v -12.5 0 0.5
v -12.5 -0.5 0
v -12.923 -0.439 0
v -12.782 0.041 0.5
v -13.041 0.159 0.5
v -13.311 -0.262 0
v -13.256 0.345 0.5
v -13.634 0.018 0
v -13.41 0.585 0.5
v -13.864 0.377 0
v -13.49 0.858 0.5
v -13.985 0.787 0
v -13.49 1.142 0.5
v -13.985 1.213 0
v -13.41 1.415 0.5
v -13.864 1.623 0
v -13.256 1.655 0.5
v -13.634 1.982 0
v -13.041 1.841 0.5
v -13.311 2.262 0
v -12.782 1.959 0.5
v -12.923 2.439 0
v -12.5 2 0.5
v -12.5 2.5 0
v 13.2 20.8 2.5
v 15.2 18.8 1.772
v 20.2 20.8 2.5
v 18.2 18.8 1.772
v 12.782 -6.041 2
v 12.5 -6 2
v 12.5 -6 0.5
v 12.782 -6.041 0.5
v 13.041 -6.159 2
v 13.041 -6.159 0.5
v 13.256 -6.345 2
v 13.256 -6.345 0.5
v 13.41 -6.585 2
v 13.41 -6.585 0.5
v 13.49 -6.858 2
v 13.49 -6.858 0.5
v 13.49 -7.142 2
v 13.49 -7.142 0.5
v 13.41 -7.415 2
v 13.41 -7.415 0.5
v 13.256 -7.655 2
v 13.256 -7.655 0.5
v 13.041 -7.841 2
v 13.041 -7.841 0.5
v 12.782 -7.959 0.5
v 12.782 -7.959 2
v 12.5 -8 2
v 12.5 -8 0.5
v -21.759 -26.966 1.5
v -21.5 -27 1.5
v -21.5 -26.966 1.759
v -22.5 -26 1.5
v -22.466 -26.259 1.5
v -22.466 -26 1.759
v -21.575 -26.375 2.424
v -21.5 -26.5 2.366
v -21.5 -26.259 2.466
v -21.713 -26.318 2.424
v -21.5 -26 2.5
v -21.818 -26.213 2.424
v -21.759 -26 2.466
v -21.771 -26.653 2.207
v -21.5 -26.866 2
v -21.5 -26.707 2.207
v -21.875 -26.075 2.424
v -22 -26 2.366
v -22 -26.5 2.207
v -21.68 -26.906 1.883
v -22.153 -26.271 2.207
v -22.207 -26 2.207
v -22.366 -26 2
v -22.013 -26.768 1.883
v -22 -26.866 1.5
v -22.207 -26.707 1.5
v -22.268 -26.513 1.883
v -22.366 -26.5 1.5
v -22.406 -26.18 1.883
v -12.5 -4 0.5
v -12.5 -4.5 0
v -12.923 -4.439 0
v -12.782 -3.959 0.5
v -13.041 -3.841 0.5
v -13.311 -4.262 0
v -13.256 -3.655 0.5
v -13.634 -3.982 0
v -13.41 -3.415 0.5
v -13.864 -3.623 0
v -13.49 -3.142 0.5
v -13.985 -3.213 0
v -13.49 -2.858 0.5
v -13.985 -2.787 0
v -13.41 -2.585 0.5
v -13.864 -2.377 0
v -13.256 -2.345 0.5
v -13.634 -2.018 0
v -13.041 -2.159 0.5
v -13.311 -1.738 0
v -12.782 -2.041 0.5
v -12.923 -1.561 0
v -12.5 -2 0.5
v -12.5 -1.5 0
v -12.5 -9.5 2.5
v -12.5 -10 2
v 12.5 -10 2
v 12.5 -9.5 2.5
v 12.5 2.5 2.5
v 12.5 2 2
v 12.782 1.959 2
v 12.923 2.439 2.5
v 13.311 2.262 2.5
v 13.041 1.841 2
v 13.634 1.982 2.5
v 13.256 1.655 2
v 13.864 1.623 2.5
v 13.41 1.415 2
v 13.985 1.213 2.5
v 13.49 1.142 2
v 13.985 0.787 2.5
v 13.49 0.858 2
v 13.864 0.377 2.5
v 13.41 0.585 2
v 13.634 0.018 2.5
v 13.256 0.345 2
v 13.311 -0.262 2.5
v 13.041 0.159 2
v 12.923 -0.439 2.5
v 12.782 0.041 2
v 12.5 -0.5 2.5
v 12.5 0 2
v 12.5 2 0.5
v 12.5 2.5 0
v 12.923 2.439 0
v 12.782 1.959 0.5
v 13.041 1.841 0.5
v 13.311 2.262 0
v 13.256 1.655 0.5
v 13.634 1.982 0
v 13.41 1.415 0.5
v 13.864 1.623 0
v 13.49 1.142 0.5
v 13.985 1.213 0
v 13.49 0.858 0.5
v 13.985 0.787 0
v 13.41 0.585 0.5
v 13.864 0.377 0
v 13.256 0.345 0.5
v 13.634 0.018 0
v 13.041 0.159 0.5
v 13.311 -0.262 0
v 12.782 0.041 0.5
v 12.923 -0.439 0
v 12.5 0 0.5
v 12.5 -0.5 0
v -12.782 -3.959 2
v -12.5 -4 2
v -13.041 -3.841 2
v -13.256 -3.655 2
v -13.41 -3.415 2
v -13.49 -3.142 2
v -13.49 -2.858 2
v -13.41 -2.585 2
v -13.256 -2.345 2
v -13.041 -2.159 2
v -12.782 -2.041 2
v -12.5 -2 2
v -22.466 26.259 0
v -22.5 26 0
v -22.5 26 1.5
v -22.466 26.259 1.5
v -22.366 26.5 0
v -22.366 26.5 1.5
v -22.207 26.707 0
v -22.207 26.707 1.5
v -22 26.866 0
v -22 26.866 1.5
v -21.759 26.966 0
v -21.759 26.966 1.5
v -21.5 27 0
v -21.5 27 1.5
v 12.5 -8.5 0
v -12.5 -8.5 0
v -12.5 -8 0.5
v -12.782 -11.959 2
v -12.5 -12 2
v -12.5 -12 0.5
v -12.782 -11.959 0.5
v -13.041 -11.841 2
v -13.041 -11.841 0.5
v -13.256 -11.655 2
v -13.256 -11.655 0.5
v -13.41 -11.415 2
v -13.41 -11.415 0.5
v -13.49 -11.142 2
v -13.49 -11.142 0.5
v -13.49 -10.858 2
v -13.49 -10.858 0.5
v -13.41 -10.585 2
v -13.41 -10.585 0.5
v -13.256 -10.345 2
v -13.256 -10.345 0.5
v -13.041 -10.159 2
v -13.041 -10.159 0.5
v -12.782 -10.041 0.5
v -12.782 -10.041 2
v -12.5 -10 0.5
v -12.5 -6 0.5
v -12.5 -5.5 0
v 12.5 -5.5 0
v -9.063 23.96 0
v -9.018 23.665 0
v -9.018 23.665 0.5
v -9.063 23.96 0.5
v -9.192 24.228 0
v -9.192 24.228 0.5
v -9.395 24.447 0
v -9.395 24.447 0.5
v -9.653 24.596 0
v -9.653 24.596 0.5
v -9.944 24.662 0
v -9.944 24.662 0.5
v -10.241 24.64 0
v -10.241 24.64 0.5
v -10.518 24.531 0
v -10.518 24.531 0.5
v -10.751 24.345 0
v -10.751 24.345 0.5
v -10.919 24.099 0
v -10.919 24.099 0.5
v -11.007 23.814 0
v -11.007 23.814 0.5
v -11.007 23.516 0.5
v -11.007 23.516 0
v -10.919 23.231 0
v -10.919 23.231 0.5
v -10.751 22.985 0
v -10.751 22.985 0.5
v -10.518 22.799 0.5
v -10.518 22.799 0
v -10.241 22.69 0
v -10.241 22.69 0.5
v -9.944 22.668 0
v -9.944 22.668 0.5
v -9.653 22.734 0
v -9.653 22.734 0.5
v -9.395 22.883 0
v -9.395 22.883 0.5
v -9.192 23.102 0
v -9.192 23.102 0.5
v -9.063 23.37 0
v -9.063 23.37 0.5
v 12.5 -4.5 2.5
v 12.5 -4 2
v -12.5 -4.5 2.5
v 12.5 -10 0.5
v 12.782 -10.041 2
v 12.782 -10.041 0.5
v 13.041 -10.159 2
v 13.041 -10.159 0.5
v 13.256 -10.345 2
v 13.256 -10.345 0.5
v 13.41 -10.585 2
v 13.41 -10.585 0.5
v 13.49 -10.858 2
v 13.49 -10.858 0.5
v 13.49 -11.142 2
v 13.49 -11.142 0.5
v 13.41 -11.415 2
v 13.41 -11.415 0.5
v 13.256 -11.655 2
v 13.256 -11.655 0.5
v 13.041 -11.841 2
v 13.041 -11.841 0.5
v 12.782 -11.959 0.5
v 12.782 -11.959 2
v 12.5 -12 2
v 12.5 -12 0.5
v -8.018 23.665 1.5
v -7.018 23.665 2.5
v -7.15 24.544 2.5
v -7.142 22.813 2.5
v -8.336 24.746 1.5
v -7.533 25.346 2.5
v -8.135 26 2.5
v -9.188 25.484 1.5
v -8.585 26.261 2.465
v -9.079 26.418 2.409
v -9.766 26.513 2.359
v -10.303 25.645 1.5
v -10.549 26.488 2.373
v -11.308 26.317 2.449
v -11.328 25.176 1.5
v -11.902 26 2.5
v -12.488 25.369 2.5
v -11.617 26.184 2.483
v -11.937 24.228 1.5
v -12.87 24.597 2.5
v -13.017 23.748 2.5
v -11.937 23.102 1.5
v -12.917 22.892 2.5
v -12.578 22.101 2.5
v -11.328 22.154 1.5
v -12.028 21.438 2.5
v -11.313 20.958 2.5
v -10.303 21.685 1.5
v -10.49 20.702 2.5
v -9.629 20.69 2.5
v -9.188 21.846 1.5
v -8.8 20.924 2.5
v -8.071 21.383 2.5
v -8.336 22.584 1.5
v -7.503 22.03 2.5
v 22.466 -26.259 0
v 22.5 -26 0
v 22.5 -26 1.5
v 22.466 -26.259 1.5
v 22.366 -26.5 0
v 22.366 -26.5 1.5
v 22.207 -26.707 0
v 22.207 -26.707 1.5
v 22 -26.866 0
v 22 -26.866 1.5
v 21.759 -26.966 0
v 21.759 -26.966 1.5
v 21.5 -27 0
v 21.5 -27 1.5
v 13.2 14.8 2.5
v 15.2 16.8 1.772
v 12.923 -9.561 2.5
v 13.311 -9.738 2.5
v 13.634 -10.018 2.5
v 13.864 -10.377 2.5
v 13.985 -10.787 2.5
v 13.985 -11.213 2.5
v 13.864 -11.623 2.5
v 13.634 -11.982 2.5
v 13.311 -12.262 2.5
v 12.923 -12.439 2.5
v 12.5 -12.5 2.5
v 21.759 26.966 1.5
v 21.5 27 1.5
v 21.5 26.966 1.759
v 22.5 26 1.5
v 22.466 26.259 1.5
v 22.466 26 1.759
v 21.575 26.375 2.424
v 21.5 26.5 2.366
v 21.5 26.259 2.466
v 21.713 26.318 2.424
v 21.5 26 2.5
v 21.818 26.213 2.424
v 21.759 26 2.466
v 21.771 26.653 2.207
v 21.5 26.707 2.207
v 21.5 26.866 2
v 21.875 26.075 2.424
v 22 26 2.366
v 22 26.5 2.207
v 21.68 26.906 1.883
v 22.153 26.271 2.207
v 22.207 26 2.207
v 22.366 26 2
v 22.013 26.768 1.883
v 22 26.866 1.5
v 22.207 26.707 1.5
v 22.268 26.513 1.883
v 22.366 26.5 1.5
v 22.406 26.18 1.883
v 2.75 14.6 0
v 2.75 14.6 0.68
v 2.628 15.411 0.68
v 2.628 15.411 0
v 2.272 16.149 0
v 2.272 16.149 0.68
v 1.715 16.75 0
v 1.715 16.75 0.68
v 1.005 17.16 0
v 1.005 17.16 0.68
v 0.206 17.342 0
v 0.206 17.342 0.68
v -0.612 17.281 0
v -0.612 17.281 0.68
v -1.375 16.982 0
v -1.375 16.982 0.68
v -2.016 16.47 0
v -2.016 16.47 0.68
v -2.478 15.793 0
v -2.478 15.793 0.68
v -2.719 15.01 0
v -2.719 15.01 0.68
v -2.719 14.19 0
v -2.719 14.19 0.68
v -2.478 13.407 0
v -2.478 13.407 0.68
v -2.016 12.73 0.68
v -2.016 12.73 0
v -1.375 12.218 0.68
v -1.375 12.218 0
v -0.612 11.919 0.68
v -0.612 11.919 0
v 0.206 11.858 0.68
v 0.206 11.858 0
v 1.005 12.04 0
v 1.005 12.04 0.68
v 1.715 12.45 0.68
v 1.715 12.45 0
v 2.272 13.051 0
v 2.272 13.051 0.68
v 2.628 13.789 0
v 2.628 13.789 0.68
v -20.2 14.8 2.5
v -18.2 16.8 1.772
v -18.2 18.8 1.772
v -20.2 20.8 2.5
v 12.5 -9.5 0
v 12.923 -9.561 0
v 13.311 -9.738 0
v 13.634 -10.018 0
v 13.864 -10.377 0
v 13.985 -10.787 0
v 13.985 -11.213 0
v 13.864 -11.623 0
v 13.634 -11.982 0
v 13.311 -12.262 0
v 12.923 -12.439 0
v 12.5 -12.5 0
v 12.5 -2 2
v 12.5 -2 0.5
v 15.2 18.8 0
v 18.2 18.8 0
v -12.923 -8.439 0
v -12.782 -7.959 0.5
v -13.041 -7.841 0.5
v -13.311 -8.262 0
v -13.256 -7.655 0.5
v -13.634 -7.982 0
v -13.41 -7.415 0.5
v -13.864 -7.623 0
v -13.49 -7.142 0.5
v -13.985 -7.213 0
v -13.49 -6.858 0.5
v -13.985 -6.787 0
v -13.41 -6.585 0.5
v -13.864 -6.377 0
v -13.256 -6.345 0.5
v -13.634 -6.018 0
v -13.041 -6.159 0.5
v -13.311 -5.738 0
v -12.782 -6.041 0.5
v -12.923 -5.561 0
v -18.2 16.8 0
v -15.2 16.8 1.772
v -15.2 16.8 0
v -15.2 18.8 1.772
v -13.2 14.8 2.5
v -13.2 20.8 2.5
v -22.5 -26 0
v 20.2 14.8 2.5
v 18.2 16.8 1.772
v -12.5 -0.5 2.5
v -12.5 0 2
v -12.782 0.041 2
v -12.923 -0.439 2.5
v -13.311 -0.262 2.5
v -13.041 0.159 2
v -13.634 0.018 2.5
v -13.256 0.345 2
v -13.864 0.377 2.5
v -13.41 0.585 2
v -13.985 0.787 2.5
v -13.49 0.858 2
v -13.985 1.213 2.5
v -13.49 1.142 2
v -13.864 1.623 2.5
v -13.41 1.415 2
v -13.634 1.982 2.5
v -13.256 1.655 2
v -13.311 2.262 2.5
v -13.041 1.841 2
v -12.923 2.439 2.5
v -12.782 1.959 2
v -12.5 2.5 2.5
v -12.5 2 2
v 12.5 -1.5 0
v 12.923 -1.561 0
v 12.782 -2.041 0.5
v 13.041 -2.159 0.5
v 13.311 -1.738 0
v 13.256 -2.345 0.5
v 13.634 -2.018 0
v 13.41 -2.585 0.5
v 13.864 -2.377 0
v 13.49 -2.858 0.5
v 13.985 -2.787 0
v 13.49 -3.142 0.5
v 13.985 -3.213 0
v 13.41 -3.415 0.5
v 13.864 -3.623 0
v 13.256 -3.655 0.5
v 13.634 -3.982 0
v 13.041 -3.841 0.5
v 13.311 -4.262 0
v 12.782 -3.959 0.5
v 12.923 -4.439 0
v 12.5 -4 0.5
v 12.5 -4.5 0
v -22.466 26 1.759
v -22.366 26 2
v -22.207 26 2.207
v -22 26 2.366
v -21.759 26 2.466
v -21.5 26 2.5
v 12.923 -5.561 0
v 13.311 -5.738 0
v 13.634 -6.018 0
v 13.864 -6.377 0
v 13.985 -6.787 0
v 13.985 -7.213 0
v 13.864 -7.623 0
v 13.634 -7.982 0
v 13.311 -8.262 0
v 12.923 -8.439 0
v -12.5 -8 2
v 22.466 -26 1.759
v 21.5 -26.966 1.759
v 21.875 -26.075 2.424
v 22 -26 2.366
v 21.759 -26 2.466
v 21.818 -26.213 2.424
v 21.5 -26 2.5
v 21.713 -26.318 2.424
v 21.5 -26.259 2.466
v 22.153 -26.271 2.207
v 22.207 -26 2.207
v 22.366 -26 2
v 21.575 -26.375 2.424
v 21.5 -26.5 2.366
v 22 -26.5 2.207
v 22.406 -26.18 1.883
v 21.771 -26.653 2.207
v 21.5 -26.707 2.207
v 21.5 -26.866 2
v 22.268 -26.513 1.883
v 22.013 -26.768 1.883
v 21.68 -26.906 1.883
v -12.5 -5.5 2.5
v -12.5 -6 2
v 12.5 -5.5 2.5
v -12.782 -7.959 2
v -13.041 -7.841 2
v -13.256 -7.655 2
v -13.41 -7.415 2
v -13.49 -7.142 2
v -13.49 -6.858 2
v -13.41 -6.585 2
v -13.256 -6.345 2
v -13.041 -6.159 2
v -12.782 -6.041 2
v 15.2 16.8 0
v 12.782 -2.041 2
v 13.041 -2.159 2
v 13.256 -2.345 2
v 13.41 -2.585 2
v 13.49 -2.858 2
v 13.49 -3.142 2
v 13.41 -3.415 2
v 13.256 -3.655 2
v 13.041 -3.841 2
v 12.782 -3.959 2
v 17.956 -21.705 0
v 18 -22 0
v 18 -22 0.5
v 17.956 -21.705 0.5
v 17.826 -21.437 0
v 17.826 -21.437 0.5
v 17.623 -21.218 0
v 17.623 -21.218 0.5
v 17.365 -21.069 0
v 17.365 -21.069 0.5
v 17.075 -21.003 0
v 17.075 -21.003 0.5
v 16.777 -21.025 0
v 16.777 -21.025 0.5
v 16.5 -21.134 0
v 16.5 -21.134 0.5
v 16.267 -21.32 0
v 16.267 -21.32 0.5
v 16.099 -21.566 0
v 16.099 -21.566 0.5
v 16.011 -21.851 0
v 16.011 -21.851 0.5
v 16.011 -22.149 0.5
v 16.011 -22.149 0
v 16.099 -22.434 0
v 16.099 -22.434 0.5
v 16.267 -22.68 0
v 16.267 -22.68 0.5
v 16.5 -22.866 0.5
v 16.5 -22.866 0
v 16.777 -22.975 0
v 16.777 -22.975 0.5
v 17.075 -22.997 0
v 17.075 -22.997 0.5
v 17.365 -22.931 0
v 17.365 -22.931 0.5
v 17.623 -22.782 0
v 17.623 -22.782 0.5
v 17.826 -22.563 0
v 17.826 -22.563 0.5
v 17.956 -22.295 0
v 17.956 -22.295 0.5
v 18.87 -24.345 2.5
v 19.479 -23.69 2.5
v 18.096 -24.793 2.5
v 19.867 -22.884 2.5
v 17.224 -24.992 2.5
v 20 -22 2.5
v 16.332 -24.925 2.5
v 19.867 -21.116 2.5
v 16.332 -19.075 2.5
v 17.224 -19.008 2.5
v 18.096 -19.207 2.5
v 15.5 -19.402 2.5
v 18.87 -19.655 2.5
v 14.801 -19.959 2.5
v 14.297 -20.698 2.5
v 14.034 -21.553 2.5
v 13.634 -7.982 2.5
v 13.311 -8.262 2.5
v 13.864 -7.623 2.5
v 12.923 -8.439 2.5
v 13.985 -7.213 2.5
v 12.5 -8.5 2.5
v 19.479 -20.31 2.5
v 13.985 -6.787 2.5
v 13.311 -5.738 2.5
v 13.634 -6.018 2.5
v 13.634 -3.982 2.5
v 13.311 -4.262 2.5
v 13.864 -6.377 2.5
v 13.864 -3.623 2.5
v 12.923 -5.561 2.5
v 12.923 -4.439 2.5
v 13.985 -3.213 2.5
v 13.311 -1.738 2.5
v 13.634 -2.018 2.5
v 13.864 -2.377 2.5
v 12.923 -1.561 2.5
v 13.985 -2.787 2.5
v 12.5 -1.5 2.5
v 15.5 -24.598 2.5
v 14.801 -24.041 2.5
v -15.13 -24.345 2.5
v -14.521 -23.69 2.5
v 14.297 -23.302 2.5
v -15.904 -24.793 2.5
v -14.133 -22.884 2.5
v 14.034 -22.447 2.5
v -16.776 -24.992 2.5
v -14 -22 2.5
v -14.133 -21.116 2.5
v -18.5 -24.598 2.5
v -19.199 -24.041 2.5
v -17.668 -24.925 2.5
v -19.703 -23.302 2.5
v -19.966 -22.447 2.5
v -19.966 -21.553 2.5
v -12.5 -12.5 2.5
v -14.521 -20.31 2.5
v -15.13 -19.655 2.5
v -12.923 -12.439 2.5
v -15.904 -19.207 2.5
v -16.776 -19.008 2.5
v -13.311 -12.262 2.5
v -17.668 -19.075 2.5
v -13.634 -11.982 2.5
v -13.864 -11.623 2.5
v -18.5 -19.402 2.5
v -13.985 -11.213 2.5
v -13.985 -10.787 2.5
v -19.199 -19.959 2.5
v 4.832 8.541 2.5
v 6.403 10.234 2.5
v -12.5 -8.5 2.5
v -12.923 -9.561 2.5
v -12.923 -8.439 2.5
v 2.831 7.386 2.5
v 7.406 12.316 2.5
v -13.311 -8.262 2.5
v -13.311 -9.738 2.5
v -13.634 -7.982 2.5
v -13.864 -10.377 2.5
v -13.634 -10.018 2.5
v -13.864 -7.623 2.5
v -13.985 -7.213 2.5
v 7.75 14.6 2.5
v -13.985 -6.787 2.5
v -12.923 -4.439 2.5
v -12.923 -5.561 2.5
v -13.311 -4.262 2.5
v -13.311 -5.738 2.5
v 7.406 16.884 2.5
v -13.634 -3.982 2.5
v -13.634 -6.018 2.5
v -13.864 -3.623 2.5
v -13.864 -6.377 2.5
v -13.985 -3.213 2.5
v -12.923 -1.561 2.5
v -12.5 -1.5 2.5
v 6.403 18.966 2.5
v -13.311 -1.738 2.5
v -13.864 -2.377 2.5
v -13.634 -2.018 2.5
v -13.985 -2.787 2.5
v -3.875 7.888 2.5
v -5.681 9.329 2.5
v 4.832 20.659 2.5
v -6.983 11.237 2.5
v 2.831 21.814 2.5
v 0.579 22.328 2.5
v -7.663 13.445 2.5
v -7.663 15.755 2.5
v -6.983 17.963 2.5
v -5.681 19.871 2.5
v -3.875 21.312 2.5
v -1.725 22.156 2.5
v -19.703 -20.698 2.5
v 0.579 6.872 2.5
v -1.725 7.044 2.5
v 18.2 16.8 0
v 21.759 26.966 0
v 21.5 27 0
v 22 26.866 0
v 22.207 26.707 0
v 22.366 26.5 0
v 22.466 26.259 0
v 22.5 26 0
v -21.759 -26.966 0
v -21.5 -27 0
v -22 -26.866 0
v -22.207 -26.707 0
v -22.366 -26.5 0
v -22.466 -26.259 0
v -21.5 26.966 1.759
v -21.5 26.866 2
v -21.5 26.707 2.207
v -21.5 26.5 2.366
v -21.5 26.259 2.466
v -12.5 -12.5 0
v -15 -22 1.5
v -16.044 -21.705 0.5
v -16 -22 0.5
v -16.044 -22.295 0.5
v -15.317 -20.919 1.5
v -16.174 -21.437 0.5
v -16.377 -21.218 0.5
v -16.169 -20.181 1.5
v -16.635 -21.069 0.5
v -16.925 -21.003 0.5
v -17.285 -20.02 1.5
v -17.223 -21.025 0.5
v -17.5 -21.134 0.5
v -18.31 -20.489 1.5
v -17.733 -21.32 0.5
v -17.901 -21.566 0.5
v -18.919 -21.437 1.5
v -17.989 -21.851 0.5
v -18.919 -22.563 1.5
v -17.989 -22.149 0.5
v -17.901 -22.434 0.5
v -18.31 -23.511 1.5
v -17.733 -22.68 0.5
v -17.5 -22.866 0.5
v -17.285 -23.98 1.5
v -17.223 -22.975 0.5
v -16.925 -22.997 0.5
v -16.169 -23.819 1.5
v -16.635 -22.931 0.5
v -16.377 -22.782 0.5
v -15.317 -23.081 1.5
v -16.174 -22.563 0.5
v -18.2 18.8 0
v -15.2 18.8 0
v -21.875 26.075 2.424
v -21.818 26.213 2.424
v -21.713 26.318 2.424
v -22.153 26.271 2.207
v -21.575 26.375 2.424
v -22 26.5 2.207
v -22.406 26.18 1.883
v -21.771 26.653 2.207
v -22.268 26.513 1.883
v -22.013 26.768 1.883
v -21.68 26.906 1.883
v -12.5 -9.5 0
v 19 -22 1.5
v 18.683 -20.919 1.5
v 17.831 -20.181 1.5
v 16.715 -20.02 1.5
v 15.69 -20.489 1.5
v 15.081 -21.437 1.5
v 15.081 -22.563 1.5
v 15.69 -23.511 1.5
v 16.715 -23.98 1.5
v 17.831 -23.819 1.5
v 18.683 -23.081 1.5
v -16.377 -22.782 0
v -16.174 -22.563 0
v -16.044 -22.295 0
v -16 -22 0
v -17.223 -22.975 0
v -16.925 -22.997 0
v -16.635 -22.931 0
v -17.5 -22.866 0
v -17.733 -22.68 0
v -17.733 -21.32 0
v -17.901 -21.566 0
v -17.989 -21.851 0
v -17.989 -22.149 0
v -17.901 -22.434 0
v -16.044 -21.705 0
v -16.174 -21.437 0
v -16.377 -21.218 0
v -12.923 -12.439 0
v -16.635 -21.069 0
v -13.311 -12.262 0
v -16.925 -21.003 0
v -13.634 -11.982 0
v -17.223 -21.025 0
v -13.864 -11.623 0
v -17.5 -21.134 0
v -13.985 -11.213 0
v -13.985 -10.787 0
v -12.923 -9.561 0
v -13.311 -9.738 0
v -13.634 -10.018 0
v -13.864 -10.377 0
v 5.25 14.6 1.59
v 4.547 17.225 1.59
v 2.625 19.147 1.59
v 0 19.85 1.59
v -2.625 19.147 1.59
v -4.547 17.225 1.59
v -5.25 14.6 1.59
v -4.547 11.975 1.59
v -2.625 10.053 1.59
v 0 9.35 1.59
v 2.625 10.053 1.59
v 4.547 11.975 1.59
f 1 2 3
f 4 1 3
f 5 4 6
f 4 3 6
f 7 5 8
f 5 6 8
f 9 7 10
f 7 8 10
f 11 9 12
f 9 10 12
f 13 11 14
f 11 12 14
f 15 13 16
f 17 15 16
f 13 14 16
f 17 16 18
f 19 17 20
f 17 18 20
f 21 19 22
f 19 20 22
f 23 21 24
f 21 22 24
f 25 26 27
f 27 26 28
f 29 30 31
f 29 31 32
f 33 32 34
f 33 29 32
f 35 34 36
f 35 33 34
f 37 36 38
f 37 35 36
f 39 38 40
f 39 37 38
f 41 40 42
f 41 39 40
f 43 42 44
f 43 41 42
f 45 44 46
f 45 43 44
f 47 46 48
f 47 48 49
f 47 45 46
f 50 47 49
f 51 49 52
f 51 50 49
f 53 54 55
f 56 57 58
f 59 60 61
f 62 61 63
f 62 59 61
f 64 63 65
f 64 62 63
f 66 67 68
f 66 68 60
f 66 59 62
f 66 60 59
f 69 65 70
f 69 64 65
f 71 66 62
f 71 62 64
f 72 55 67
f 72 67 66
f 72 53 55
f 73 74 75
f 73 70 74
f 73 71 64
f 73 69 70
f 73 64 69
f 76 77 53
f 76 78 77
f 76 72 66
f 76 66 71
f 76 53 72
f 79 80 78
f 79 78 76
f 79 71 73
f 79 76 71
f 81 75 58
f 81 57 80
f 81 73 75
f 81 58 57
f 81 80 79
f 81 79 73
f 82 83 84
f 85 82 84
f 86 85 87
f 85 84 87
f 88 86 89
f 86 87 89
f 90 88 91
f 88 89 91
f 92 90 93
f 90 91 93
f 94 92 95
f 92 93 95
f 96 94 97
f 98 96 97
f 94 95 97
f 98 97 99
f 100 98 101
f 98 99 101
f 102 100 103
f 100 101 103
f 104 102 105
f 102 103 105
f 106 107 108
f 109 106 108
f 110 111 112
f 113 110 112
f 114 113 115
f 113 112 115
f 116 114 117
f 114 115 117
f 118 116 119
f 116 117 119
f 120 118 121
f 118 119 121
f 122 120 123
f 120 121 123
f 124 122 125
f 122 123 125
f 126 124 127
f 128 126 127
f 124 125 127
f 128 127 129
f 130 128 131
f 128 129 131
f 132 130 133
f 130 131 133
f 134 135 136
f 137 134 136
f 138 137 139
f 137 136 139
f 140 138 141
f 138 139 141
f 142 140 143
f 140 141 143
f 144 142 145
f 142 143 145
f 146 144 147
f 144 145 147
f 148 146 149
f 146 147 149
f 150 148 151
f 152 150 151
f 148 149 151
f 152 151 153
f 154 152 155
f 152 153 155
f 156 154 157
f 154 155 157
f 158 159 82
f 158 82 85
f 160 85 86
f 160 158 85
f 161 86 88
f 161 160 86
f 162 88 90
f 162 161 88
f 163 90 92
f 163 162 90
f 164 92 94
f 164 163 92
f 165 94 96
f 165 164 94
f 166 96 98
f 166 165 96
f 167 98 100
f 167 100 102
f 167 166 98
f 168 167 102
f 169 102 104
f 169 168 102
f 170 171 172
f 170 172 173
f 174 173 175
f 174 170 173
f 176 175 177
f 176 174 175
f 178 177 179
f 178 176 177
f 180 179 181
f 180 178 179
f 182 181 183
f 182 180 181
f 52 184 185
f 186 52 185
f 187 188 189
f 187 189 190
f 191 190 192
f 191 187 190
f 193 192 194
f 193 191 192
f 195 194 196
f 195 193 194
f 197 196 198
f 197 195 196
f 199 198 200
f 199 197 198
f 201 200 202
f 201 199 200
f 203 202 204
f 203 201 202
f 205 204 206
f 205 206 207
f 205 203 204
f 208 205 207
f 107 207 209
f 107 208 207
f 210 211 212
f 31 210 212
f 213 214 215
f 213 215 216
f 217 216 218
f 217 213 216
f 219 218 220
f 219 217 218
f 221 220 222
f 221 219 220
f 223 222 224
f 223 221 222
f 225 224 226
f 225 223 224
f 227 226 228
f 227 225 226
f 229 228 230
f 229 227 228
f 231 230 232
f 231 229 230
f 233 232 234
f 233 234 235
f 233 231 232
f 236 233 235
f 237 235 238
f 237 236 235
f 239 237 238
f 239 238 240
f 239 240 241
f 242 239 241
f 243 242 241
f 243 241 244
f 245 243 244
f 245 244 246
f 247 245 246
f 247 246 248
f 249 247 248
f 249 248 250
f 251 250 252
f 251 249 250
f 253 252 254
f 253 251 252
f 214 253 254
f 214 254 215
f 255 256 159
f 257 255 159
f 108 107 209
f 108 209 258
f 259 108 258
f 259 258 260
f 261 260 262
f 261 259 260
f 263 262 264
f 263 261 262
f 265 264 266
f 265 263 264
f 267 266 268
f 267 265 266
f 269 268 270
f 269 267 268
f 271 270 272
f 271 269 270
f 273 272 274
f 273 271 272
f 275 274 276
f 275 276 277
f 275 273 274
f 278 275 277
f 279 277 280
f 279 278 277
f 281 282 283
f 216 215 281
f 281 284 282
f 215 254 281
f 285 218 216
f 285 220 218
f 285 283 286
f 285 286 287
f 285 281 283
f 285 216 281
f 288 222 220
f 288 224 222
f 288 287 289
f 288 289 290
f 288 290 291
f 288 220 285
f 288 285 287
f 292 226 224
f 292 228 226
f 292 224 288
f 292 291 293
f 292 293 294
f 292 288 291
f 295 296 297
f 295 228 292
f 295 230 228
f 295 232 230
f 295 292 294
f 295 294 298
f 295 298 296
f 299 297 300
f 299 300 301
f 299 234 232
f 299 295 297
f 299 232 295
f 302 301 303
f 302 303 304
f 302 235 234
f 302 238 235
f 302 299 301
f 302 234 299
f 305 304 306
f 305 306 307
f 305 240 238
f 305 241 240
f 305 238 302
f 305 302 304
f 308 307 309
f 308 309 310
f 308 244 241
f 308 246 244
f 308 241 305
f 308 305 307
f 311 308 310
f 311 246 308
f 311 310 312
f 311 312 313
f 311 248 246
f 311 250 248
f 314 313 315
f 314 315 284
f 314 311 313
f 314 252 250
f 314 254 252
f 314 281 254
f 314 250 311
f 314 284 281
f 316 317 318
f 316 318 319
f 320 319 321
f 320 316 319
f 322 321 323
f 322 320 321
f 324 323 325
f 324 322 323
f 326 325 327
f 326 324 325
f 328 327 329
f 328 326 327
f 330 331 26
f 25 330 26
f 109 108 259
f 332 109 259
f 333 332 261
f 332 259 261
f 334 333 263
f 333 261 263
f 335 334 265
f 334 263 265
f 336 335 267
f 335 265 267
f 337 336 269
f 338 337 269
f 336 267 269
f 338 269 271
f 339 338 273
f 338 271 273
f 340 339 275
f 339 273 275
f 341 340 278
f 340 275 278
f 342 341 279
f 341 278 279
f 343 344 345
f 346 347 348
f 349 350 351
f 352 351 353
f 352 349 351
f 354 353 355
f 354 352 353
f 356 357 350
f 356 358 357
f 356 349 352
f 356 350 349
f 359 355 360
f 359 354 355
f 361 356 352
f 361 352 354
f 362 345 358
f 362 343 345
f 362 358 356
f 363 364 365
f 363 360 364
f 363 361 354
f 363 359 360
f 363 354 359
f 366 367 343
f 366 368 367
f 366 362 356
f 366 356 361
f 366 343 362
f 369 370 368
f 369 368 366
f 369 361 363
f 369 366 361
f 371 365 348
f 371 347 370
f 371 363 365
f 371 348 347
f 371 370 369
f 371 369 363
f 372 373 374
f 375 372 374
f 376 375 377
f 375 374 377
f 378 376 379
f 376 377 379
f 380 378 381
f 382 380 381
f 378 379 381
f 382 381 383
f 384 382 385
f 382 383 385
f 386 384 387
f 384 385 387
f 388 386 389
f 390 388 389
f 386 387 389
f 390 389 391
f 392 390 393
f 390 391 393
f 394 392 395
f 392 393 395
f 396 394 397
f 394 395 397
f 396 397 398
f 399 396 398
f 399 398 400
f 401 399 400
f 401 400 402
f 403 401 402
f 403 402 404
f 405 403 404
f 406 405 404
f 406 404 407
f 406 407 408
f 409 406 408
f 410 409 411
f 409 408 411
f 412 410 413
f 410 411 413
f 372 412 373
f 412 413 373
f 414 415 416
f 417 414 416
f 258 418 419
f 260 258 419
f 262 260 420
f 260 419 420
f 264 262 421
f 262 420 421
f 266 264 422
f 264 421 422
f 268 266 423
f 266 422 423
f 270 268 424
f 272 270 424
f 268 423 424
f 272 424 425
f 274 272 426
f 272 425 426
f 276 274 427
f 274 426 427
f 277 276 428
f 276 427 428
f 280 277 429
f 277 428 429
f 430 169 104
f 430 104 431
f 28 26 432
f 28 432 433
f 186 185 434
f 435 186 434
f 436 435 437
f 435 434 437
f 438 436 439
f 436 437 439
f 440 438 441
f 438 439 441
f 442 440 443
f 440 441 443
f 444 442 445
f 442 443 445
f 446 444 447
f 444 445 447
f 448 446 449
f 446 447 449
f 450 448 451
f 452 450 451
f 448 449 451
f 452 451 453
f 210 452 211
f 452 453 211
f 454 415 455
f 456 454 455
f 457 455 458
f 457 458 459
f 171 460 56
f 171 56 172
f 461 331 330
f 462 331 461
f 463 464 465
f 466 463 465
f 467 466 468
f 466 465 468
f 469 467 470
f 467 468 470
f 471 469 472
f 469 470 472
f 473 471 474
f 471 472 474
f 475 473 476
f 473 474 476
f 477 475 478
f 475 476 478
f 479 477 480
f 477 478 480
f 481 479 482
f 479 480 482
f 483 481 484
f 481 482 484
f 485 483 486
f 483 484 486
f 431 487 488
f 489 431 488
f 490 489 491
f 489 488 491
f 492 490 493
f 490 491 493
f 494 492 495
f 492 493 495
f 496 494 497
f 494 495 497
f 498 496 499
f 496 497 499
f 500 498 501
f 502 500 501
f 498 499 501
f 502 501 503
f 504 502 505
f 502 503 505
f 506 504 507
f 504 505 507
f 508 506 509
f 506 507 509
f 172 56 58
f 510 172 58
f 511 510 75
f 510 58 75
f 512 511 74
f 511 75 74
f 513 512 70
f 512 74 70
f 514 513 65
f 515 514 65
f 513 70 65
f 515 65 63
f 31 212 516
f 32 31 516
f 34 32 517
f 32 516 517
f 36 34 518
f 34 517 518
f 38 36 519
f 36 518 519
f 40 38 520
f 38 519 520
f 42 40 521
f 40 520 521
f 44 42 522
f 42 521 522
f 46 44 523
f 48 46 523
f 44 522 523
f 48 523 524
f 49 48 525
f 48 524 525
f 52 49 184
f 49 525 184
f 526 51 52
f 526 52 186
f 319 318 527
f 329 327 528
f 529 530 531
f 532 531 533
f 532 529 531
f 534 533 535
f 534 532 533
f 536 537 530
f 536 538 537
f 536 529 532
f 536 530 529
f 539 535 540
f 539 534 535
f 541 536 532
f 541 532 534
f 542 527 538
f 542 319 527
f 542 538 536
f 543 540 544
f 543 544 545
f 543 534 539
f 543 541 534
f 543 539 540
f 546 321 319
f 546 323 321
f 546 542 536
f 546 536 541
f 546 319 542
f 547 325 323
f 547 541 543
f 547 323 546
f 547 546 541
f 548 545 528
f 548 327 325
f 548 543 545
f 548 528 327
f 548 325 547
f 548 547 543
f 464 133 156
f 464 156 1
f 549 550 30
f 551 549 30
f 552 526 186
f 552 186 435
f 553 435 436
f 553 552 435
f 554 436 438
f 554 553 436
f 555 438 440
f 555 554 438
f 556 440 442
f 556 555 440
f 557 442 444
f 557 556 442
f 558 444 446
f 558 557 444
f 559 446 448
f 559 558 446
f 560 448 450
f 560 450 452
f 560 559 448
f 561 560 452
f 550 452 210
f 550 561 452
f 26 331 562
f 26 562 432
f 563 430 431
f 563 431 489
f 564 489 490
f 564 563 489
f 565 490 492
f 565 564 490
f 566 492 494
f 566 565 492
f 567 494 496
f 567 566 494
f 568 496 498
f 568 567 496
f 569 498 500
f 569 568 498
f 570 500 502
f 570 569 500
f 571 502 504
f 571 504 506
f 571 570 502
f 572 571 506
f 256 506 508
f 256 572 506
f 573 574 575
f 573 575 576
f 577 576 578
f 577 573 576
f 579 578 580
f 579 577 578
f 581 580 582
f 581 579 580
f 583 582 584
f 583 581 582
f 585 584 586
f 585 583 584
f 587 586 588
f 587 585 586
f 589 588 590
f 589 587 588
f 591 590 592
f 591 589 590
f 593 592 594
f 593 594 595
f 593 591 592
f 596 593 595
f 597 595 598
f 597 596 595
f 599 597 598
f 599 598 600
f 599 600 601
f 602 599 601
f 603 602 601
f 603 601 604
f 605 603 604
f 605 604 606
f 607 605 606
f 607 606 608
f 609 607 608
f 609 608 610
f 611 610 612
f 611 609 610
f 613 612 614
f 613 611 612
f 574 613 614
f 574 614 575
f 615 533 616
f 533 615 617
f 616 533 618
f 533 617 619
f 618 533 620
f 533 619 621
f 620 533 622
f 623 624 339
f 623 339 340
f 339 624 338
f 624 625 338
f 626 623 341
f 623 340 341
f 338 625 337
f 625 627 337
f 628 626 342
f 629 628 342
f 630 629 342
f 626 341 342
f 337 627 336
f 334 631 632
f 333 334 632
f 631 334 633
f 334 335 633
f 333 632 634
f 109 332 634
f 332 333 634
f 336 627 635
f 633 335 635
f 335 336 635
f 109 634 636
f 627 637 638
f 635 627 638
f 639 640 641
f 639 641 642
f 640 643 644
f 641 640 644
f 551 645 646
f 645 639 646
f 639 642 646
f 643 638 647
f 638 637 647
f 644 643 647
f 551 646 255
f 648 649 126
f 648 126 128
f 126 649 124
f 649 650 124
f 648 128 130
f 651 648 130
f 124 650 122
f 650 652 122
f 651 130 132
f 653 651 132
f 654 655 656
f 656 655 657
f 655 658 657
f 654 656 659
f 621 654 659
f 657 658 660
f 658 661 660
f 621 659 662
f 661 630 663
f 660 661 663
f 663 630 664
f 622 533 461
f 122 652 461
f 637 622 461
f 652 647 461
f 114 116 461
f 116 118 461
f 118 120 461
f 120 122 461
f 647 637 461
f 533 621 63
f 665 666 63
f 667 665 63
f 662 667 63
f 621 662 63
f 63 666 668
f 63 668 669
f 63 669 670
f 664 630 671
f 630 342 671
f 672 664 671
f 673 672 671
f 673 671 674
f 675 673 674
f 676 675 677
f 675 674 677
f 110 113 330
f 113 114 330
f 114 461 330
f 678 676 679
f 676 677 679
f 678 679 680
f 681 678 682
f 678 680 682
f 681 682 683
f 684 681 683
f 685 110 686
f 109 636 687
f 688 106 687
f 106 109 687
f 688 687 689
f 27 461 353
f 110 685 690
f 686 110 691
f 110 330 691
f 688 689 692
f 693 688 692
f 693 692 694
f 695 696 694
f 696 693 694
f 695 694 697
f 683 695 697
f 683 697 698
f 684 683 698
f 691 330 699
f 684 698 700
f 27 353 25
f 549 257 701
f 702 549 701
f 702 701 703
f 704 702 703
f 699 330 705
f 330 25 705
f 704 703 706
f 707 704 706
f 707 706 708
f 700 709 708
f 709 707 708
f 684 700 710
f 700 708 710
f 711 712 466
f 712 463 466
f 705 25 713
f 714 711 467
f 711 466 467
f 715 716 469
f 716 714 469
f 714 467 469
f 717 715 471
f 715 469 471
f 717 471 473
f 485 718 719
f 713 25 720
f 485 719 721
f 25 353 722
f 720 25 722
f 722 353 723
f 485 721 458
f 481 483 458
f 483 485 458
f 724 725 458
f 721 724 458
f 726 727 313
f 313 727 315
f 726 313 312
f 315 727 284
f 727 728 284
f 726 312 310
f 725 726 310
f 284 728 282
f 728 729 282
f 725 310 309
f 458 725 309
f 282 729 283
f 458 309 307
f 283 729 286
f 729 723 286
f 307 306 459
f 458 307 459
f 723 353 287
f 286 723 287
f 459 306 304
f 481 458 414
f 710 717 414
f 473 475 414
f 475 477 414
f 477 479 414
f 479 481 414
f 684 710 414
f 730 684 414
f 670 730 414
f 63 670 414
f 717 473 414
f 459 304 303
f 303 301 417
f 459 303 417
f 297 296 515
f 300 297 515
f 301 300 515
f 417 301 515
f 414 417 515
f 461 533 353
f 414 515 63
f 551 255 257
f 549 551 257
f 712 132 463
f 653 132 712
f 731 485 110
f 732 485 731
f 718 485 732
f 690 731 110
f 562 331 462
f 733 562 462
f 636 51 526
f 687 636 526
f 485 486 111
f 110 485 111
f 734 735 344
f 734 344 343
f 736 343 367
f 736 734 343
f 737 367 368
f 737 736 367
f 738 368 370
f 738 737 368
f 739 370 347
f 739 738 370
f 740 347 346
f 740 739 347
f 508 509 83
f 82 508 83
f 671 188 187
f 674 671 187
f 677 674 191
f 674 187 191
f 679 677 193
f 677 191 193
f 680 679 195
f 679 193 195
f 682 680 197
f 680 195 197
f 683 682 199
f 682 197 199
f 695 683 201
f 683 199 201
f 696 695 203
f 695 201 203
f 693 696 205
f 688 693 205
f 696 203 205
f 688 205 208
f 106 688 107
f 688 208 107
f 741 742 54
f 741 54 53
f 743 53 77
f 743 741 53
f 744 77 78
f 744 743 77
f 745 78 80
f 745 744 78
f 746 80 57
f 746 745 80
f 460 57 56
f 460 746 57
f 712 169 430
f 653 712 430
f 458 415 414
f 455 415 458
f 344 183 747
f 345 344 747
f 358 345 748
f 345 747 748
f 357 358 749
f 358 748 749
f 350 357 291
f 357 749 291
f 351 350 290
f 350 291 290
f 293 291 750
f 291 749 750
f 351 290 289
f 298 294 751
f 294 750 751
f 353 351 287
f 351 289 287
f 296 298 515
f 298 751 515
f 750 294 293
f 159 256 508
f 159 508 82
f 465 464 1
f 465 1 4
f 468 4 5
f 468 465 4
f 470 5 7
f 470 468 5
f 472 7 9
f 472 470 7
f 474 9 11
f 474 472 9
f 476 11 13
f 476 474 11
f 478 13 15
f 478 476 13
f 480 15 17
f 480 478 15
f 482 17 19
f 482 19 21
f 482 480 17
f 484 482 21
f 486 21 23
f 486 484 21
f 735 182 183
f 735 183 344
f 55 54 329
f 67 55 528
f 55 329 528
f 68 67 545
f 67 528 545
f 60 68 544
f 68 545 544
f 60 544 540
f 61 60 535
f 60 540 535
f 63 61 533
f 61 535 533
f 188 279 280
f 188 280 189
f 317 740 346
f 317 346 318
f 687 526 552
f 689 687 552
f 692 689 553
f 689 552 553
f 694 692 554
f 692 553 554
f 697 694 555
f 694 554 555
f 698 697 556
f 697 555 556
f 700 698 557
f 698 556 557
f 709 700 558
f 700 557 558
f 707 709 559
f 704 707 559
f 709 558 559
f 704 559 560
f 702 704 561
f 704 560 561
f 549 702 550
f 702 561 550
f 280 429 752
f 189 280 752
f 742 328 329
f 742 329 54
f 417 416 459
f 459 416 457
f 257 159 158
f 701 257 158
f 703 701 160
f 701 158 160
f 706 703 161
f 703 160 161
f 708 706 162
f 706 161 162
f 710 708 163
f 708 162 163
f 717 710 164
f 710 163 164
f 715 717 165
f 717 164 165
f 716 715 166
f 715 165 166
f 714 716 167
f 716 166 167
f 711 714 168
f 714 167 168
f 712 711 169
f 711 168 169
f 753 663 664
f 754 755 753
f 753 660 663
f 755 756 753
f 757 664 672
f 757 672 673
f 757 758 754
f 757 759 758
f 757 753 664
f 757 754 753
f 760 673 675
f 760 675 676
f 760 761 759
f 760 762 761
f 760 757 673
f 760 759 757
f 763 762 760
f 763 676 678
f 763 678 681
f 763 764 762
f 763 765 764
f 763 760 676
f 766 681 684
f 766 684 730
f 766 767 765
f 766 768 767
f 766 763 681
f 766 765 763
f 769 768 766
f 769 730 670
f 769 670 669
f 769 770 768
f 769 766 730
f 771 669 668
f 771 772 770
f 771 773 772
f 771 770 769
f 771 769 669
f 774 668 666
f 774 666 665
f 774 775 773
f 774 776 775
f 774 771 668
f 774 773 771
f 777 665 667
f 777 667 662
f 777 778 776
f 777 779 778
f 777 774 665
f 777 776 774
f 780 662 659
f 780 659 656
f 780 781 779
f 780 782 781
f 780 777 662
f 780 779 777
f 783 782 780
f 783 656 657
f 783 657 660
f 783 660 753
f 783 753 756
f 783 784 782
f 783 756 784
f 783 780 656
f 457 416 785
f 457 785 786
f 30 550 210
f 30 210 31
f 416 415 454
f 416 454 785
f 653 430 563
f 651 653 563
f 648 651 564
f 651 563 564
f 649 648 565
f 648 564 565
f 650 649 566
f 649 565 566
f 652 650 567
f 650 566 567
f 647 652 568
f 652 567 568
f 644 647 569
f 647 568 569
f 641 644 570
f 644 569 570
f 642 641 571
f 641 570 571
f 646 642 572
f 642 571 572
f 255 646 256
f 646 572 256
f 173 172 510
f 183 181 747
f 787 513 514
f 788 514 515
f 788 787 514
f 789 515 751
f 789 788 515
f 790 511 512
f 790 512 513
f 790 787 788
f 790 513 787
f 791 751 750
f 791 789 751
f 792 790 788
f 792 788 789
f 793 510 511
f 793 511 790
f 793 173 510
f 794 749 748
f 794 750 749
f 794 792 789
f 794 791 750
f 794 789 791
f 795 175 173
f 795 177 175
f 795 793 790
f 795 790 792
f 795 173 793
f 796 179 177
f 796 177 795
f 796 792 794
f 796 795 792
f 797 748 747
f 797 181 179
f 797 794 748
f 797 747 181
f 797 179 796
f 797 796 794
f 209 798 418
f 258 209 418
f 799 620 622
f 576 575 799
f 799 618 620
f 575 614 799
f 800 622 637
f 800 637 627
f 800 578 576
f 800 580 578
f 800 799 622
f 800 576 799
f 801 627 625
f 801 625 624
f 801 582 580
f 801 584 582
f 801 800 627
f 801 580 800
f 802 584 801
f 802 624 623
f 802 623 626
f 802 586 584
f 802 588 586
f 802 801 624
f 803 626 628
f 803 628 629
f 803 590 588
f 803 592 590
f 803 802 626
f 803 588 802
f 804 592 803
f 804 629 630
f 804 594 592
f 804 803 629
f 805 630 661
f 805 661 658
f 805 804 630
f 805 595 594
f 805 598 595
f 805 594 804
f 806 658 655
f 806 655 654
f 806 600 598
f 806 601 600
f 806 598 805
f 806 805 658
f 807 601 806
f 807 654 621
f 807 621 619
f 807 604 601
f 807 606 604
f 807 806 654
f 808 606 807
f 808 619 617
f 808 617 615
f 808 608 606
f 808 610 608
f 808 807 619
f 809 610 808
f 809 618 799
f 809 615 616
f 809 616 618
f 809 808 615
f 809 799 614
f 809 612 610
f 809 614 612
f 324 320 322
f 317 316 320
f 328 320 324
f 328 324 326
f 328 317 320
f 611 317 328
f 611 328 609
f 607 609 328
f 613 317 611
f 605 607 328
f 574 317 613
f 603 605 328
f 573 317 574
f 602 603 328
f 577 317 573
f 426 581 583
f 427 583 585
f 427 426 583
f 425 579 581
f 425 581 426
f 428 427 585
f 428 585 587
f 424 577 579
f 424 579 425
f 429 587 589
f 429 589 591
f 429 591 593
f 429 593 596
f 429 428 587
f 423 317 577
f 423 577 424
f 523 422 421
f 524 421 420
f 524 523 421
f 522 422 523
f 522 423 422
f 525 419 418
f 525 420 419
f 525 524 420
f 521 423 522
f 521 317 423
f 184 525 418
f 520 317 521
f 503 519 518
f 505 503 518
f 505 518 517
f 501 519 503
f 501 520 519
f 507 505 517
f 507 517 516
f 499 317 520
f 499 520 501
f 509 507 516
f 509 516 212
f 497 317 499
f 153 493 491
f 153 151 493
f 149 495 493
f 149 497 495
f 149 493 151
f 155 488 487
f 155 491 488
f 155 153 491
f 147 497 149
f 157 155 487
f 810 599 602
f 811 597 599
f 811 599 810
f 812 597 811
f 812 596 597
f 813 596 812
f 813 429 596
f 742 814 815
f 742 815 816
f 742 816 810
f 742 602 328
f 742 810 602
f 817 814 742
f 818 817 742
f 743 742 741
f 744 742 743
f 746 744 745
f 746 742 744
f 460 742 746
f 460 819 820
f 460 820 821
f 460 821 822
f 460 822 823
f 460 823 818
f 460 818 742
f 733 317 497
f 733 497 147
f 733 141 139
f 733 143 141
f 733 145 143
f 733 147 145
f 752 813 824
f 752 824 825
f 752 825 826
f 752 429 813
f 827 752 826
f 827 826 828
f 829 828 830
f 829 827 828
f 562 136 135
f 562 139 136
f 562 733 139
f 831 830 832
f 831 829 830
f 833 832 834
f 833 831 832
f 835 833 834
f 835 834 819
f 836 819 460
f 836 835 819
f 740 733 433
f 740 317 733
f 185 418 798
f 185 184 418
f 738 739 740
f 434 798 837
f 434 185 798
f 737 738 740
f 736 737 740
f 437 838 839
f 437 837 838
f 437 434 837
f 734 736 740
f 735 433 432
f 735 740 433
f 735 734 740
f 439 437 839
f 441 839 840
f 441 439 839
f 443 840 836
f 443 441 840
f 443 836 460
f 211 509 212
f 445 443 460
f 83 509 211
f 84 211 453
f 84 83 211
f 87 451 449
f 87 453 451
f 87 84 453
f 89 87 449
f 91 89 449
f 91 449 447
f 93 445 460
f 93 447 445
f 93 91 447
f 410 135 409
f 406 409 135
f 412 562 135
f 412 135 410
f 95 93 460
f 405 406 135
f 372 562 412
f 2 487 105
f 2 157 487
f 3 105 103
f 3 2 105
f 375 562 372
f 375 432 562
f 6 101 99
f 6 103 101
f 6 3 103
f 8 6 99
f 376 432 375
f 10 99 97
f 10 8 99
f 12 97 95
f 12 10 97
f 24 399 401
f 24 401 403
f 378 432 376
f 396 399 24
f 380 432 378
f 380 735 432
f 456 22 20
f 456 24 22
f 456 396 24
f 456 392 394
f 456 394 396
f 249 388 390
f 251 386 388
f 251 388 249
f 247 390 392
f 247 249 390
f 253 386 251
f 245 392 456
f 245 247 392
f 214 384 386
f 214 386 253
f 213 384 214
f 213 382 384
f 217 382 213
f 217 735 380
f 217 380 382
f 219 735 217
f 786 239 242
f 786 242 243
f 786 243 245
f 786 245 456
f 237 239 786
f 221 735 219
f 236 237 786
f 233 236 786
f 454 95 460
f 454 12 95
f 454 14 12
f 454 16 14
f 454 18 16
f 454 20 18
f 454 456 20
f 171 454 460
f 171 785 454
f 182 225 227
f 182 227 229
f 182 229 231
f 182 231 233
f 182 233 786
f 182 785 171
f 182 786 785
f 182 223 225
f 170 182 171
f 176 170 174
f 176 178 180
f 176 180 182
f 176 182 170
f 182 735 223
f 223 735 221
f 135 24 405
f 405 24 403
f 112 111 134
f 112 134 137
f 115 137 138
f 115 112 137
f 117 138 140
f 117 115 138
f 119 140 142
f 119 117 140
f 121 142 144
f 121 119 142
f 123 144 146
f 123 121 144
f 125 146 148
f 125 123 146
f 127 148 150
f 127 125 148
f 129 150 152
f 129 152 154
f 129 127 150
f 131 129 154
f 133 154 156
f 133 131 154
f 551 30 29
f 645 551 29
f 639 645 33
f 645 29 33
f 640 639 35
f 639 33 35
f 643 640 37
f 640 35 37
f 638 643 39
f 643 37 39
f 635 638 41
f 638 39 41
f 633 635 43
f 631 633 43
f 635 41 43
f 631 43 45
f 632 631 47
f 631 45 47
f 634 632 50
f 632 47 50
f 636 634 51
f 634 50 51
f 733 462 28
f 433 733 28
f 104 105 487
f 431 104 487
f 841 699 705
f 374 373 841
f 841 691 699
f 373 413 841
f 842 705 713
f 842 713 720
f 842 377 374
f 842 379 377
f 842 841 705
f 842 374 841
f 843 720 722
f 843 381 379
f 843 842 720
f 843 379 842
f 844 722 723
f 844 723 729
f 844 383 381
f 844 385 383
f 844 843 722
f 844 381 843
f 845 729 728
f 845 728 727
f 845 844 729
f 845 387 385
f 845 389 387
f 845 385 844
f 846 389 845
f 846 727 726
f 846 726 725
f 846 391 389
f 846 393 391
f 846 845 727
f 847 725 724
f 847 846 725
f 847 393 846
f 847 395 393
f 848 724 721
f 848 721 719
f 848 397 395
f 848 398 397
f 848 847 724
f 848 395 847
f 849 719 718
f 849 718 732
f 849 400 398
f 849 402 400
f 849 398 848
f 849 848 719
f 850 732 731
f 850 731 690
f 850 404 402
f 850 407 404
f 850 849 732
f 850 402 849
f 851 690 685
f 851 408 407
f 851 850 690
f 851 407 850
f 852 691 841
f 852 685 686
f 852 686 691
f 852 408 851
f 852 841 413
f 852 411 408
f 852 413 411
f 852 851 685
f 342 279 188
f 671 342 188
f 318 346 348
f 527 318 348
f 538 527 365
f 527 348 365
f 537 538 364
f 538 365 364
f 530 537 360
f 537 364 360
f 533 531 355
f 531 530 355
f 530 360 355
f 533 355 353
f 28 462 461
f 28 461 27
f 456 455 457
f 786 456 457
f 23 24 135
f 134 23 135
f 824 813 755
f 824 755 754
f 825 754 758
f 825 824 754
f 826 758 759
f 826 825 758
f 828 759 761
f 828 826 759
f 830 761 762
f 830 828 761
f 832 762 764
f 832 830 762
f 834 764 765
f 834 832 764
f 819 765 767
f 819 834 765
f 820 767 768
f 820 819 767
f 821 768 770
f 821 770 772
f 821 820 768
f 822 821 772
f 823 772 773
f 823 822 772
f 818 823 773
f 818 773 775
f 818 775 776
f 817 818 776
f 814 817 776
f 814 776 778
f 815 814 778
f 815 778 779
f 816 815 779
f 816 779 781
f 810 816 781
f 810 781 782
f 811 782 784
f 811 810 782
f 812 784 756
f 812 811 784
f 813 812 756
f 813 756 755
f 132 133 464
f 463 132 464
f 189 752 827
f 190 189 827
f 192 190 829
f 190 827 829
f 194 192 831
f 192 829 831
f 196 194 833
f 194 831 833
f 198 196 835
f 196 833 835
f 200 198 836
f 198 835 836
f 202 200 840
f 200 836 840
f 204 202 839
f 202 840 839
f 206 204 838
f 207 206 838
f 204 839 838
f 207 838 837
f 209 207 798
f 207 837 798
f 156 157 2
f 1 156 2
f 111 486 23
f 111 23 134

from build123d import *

# Parameters (mm, degrees)
SKETCH1_R           = 1
SKETCH1_R_2         = 1.0000000000000018
BOSS_EXTRUDE1_DEPTH = 2.5
SKETCH2_R           = 2.7499999999999996
CUT_EXTRUDE1_DEPTH  = 2.5
CHAMFER1_SIZE       = 5
CHAMFER1_SIZE2      = 1.819851171331016
CUT_EXTRUDE2_DEPTH  = 2.5
CHAMFER2_SIZE       = 0.5
CHAMFER3_SIZE       = 2
SKETCH4_W           = 2.9999999999999982
SKETCH4_H           = 2
CUT_EXTRUDE3_DEPTH  = 2.5
CHAMFER4_SIZE       = 2
CHAMFER4_SIZE2      = 0.7279404685324065
FILLET1_R           = 1


with BuildPart() as part:
    # Sketch1 → Boss-Extrude1 (new body)
    with BuildSketch(Plane.XY):
        with BuildLine():
            Line((21.499999999999993, -26.999999999999996), (-21.499999999999993, -26.999999999999996))
            ThreePointArc((-21.499999999999993, -26.999999999999996), (-22.207106781186546, -26.707106781186543), (-22.5, -25.99999999999999))
            Line((-22.5, -25.99999999999999), (-22.5, 25.99999999999999))
            ThreePointArc((-22.5, 25.99999999999999), (-22.207106781186546, 26.707106781186543), (-21.499999999999993, 26.999999999999996))
            Line((-21.499999999999993, 26.999999999999996), (21.499999999999993, 26.999999999999996))
            ThreePointArc((21.499999999999993, 26.999999999999996), (22.207106781186546, 26.707106781186543), (22.5, 25.99999999999999))
            Line((22.5, 25.99999999999999), (22.5, -25.99999999999999))
            ThreePointArc((22.5, -25.99999999999999), (22.207106781186546, -26.707106781186543), (21.499999999999993, -26.999999999999996))
        make_face()
        with Locations((-10.018444645439217, 23.665000000000006)):
            Circle(SKETCH1_R, mode=Mode.SUBTRACT)
        with Locations((-17, -22.000000000000007)):
            Circle(SKETCH1_R_2, mode=Mode.SUBTRACT)
        with Locations((17, -22.000000000000004)):
            Circle(SKETCH1_R_2, mode=Mode.SUBTRACT)
    extrude(amount=BOSS_EXTRUDE1_DEPTH)

    # Sketch2 → Cut-Extrude1 (cut)
    with BuildSketch(Plane.XY.offset(2.5)):
        with Locations((0, 14.599999999999996)):
            Circle(SKETCH2_R)
    extrude(amount=-CUT_EXTRUDE1_DEPTH, mode=Mode.SUBTRACT)

    # Chamfer1
    chamfer1_edges = [part.edges().sort_by_distance(p)[0] for p in [
        (-2.7499999999999996, 14.599999999999996, 2.5),
    ]]
    chamfer1_side = [part.faces().sort_by_distance(p)[0] for p in [
        (0.01313623413448006, -0.11811006320101064, 2.5),
    ]]
    chamfer(chamfer1_edges, length=CHAMFER1_SIZE, length2=CHAMFER1_SIZE2, reference=chamfer1_side[0])

    # Sketch3 → Cut-Extrude2 (cut)
    with BuildSketch(Plane.XY.offset(2.5)):
        with BuildLine():
            Line((-12.5, 2), (12.5, 2.0000000000000053))
            ThreePointArc((12.5, 2.0000000000000053), (13.5, 1.0000000000000036), (12.5, 4.34e-15))
            Line((12.5, 4.34e-15), (-12.5, 0))
            ThreePointArc((-12.5, 0), (-13.5, 1.0000000000000002), (-12.5, 2))
        make_face()
        with BuildLine():
            Line((-12.5, -2), (12.5, -2))
            ThreePointArc((12.5, -2), (13.5, -3), (12.5, -4))
            Line((12.5, -4), (-12.5, -4))
            ThreePointArc((-12.5, -4), (-13.5, -3), (-12.5, -2))
        make_face()
        with BuildLine():
            Line((-12.5, -6.000000000000001), (12.5, -6.000000000000001))
            ThreePointArc((12.5, -6.000000000000001), (13.5, -7), (12.5, -8))
            Line((12.5, -8), (-12.5, -8))
            ThreePointArc((-12.5, -8), (-13.5, -7), (-12.5, -6.000000000000001))
        make_face()
        with BuildLine():
            Line((-12.5, -9.999999999999998), (12.5, -9.999999999999998))
            ThreePointArc((12.5, -9.999999999999998), (13.5, -11), (12.5, -12))
            Line((12.5, -12), (-12.5, -12))
            ThreePointArc((-12.5, -12), (-13.500000000000002, -11), (-12.5, -9.999999999999998))
        make_face()
    extrude(amount=-CUT_EXTRUDE2_DEPTH, mode=Mode.SUBTRACT)

    # Chamfer2
    chamfer2_edges = [part.edges().sort_by_distance(p)[0] for p in [
        (-13.5, 0.9999999999999999, 0),
        (0, 2.0000000000000027, 0),
        (13.5, 1.0000000000000049, 0),
        (0, 2.17e-15, 0),
        (-13.5, 0.9999999999999999, 2.5),
        (0, 2.17e-15, 2.5),
        (13.5, 1.0000000000000049, 2.5),
        (0, 2.0000000000000027, 2.5),
        (-13.5, -3, 0),
        (0, -2, 0),
        (13.5, -3, 0),
        (0, -4, 0),
        (-13.5, -3, 2.5),
        (0, -4, 2.5),
        (13.5, -3, 2.5),
        (0, -2, 2.5),
        (-13.5, -7, 0),
        (0, -6.000000000000001, 0),
        (13.5, -7, 0),
        (0, -8, 0),
        (-13.5, -7, 2.5),
        (0, -8, 2.5),
        (13.5, -7, 2.5),
        (0, -6.000000000000001, 2.5),
        (-13.500000000000002, -11, 0),
        (0, -9.999999999999998, 0),
        (13.5, -11, 0),
        (0, -12, 0),
        (-13.500000000000002, -11, 2.5),
        (0, -12, 2.5),
        (13.5, -11, 2.5),
        (0, -9.999999999999998, 2.5),
    ]]
    chamfer(chamfer2_edges, length=CHAMFER2_SIZE)

    # Chamfer3
    chamfer3_edges = [part.edges().sort_by_distance(p)[0] for p in [
        (-11.018444645439217, 23.665000000000006, 2.5),
        (-18, -22.000000000000007, 2.5),
        (15.999999999999998, -22.000000000000004, 2.5),
    ]]
    chamfer(chamfer3_edges, length=CHAMFER3_SIZE)

    # Sketch4 → Cut-Extrude3 (cut)
    with BuildSketch(Plane.XY.offset(2.5)):
        with Locations((-16.7, 17.799999999999997)):
            Rectangle(SKETCH4_W, SKETCH4_H)
        with Locations((16.7, 17.799999999999997)):
            Rectangle(SKETCH4_W, SKETCH4_H)
    extrude(amount=-CUT_EXTRUDE3_DEPTH, mode=Mode.SUBTRACT)

    # Chamfer4
    chamfer4_edges = [part.edges().sort_by_distance(p)[0] for p in [
        (-15.200000000000001, 17.799999999999997, 2.5),
        (-16.7, 18.799999999999997, 2.5),
        (-18.2, 17.799999999999997, 2.5),
        (-16.7, 16.799999999999997, 2.5),
        (18.2, 17.799999999999997, 2.5),
        (16.7, 18.799999999999997, 2.5),
        (15.200000000000001, 17.799999999999997, 2.5),
        (16.7, 16.799999999999997, 2.5),
    ]]
    chamfer4_side = [part.faces().sort_by_distance(p)[0] for p in [
        (0, -26.297077529168398, 2.5),
    ]]
    chamfer(chamfer4_edges, length=CHAMFER4_SIZE, length2=CHAMFER4_SIZE2, reference=chamfer4_side[0])

    # Fillet1
    # the kernel refuses this fillet: 1 mm, written as the material it takes off along each edge
    with BuildSketch(Plane(origin=(21.499999999999996, -25.999999999999993, 2.5), x_dir=(1, 3.55e-15, 0), z_dir=(-3.55e-15, 1, 0))) as fillet1_piece_1:
        with BuildLine():
            CenterArc((1.0000000000000036 - FILLET1_R, FILLET1_R), FILLET1_R, 270, 90)
            Line((1.0000000000000036, FILLET1_R), (1.0000000000000036, 0))
            Line((1.0000000000000036, 0), (1.0000000000000036 - FILLET1_R, 0))
        make_face()
    revolve(axis=Axis((21.499999999999996, -25.999999999999993, 2.5), (0, 0, -1)), revolution_arc=90.00000000000041, mode=Mode.SUBTRACT)
    with BuildSketch(Plane(origin=(22.5, 25.99999999999999, 2.5), x_dir=(-1, 0, 0), z_dir=(0, -1, 0)), Plane(origin=(-22.5, -25.99999999999999, 2.5), x_dir=(1, 0, 0), z_dir=(0, 1, 0))) as fillet1_piece_2:
        with BuildLine():
            CenterArc((FILLET1_R, FILLET1_R), FILLET1_R, 180, 90)
            Line((0, FILLET1_R), (0, 0))
            Line((0, 0), (FILLET1_R, 0))
        make_face()
    extrude(amount=51.99999999999998, mode=Mode.SUBTRACT)
    with BuildSketch(Plane(origin=(21.499999999999996, 25.999999999999993, 2.5), x_dir=(-3.55e-15, 1, 0), z_dir=(-1, -3.55e-15, 0))) as fillet1_piece_3:
        with BuildLine():
            CenterArc((1.0000000000000036 - FILLET1_R, FILLET1_R), FILLET1_R, 270, 90)
            Line((1.0000000000000036, FILLET1_R), (1.0000000000000036, 0))
            Line((1.0000000000000036, 0), (1.0000000000000036 - FILLET1_R, 0))
        make_face()
    revolve(axis=Axis((21.499999999999996, 25.999999999999993, 2.5), (0, 0, -1)), revolution_arc=90.00000000000041, mode=Mode.SUBTRACT)
    with BuildSketch(Plane(origin=(-21.499999999999993, 26.999999999999996, 2.5), x_dir=(0, -1, 0), z_dir=(1, 0, 0)), Plane(origin=(21.499999999999993, -26.999999999999996, 2.5), x_dir=(0, 1, 0), z_dir=(-1, 0, 0))) as fillet1_piece_4:
        with BuildLine():
            CenterArc((FILLET1_R, FILLET1_R), FILLET1_R, 180, 90)
            Line((0, FILLET1_R), (0, 0))
            Line((0, 0), (FILLET1_R, 0))
        make_face()
    extrude(amount=42.999999999999986, mode=Mode.SUBTRACT)
    with BuildSketch(Plane(origin=(-21.499999999999996, 25.999999999999993, 2.5), x_dir=(-1, -3.55e-15, 0), z_dir=(3.55e-15, -1, 0))) as fillet1_piece_5:
        with BuildLine():
            CenterArc((1.0000000000000036 - FILLET1_R, FILLET1_R), FILLET1_R, 270, 90)
            Line((1.0000000000000036, FILLET1_R), (1.0000000000000036, 0))
            Line((1.0000000000000036, 0), (1.0000000000000036 - FILLET1_R, 0))
        make_face()
    revolve(axis=Axis((-21.499999999999996, 25.999999999999993, 2.5), (0, 0, -1)), revolution_arc=90.00000000000041, mode=Mode.SUBTRACT)
    with BuildSketch(Plane(origin=(-21.499999999999996, -25.999999999999993, 2.5), x_dir=(3.55e-15, -1, 0), z_dir=(1, 3.55e-15, 0))) as fillet1_piece_6:
        with BuildLine():
            CenterArc((1.0000000000000036 - FILLET1_R, FILLET1_R), FILLET1_R, 270, 90)
            Line((1.0000000000000036, FILLET1_R), (1.0000000000000036, 0))
            Line((1.0000000000000036, 0), (1.0000000000000036 - FILLET1_R, 0))
        make_face()
    revolve(axis=Axis((-21.499999999999996, -25.999999999999993, 2.5), (0, 0, -1)), revolution_arc=90.00000000000041, mode=Mode.SUBTRACT)


solid = part.part
